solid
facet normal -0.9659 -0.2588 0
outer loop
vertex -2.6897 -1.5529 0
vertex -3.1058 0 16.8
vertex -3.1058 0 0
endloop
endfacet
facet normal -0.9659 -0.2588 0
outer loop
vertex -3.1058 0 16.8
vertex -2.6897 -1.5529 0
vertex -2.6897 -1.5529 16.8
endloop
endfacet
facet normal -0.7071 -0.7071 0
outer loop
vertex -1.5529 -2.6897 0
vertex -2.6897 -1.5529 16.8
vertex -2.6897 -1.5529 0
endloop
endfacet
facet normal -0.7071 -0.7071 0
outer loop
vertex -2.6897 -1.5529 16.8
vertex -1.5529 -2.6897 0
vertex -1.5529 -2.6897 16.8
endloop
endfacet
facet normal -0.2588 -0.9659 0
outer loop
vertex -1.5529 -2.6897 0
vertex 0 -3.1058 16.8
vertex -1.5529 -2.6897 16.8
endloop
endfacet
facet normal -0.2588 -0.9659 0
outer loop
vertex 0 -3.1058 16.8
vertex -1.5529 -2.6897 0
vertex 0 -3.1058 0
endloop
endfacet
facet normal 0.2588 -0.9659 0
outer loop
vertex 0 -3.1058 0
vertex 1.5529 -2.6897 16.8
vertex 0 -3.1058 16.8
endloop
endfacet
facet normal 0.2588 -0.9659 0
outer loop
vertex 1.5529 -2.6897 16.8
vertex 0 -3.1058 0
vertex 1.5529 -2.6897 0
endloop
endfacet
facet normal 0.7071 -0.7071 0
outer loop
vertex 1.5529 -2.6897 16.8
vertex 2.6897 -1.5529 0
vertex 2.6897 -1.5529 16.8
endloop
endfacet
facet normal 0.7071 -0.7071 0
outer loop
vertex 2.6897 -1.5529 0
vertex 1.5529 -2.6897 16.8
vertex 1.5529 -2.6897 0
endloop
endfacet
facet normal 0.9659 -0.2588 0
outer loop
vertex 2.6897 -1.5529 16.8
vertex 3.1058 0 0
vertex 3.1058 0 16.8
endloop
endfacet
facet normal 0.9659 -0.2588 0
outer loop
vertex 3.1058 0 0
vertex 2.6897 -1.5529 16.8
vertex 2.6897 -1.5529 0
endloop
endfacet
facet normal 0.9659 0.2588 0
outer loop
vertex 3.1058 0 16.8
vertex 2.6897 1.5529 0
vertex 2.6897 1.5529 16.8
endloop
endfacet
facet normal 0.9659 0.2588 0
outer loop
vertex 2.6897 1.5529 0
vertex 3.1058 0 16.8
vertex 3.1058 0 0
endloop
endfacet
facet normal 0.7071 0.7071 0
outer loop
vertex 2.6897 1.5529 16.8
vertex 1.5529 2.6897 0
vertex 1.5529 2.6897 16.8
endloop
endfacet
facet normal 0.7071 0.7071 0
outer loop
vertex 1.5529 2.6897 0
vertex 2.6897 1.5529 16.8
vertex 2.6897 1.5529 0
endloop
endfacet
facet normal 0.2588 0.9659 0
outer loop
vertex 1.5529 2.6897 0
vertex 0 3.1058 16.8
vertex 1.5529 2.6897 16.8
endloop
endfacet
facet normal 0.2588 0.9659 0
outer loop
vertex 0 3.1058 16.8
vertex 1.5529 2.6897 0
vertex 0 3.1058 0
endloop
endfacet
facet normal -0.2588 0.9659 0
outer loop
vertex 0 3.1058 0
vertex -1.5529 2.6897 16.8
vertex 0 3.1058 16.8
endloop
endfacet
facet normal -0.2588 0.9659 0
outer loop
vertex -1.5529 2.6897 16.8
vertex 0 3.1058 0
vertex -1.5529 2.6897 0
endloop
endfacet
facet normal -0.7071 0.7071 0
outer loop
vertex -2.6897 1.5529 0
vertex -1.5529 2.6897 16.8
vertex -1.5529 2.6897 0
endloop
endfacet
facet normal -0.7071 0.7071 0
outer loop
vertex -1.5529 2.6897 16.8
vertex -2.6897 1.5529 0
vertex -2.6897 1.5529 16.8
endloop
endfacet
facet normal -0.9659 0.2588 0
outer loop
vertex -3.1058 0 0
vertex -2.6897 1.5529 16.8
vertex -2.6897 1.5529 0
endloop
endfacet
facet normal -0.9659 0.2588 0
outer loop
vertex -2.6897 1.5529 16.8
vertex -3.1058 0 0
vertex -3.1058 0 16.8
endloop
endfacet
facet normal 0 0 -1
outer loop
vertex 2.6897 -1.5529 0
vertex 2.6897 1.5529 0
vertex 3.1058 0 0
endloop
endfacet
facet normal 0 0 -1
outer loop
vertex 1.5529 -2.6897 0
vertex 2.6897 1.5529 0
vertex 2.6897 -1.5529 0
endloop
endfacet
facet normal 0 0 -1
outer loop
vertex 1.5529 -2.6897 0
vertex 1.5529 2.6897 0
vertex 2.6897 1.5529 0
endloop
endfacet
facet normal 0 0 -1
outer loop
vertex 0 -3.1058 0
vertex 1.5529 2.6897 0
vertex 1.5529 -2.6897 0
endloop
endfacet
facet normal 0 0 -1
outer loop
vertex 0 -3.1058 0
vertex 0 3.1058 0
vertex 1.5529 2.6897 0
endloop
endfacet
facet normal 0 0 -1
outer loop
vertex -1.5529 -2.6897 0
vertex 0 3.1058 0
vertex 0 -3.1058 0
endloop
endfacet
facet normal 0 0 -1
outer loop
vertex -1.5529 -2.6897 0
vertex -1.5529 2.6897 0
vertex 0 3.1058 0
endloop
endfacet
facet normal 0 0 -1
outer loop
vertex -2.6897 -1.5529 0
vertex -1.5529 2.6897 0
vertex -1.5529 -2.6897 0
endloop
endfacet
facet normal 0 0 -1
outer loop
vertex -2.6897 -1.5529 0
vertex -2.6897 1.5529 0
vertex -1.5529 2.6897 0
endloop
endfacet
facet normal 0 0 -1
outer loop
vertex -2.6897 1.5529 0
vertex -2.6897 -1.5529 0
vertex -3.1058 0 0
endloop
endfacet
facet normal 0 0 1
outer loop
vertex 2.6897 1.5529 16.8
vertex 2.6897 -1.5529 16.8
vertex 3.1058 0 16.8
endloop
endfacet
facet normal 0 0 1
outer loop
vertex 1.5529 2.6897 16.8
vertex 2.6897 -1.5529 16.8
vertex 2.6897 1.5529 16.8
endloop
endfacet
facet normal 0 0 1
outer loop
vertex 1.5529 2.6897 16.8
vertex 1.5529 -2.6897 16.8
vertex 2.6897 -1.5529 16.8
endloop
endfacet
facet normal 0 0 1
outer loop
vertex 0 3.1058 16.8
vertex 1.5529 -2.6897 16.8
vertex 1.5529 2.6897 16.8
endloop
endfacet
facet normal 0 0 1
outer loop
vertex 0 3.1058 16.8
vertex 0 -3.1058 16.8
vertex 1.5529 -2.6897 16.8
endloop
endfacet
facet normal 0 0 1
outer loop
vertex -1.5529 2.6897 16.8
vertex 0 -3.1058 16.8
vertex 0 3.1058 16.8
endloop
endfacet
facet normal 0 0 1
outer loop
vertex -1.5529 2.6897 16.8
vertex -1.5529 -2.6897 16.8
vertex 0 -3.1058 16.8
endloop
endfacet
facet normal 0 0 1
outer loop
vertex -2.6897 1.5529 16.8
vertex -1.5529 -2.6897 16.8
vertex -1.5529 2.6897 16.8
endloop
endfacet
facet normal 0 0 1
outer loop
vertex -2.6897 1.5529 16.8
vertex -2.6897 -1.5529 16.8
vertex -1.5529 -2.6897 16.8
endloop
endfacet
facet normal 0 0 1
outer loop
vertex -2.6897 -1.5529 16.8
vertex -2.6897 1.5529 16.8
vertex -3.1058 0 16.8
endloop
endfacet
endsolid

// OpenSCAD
// file: parameters.scad
// Parameters file for RepRap Huxley

pi=3.14159265;

// The relative location in your file system where the .dxf files are
// DXFs are for quick development.  They should be replaced by parameterised CSG in dure course.

fileroot="DXF-files/";

rodsize = 6;	//threaded/smooth rod diameter in mm
xaxis = 182.5;	//width of base in mm
yaxis = 266.5;	//length of base in mm


screwsize = 3;	//bearing bore/screw diameter in mm
bearingsize = 10;	//outer diameter of bearings in mm
bearingwidth = 4;	//width of bearings in mm


rodpitch = rodsize / 6;
rodnutsize = 0.8 * rodsize; //4.8
rodwashersize = 0.2 * rodsize; //1.2
rodwasherdiameter = 2 * rodsize;//12
screwpitch = screwsize / 6;
nutsize = 0.8 * screwsize;
nutdiameter = 1.9 * screwsize;
washersize = 0.2 * screwsize;
washerdiameter = 2 * screwsize;
partthick = 2 * (rodsize+1); //12
vertexrodspace = 2 * rodsize; //12


c = [0.3, 0.3, 0.3];
rodendoffset = rodnutsize + rodwashersize * 2 + partthick / 2;//13.2
vertexoffset = vertexrodspace + rodendoffset;//25.2
//vertexoffset = 22;

renderrodthreads = false;
renderscrewthreads = false;
fn = 36;

// The gap between the joining rods at a vertex

vertex_radius=sqrt(rodsize*rodsize + vertexoffset*vertexoffset);
vertex_ang = atan(vertexoffset/rodsize)-30;
vertex_gap = 2*vertex_radius*cos(vertex_ang);

// Nema 14 dimensions - these are absolute

nema14_square=35.3;
nema14_screws=26;
nema14_screw_r=1.5;
nema14_hub=22;
nema14_hub_depth=2;
nema14_length=36;
nema14_shaft=5;
nema14_shaft_length=66;
nema14_shaft_projection=19;

// Nema 11 dimensions - these are absolute

nema11_square=28.5;
nema11_screws=23;
nema11_screw_r=1.25;
nema11_hub=22;
nema11_hub_depth=2;
nema11_length=44.5;
nema11_shaft=5;
nema11_shaft_length=78;
nema11_shaft_projection=18;

// Limit switch parameters

limit_switch_hole_diameter=2.5;
limit_switch_centres=9.5;

// The RepRap slide bearings

bearing_mount_centres=18;
bearing_width=7;

// X axis parameters - many should be relative

x_bar_gap=30;
motor_center_y = 26;
bar_clamp_x=5;
bar_clamp_y=8;
bar_clamp_x_gap=23;
bearing_y=50;
bearing_x=bar_clamp_x_gap + 10;
hole_land=4;
thickness=5;
bearing_low_z = 8;
bearing_z_gap = 25;
bearing_plate_width = bearing_mount_centres+2*hole_land + 10;
bearing_plate_overlap=0.5;
bearing_plate_support=10;
// main file
use<library.scad>
hole=6;
partthick=14;

module spool_foot()
{
	polyhole(partthick*1.2,hole);
}

spool_foot();
